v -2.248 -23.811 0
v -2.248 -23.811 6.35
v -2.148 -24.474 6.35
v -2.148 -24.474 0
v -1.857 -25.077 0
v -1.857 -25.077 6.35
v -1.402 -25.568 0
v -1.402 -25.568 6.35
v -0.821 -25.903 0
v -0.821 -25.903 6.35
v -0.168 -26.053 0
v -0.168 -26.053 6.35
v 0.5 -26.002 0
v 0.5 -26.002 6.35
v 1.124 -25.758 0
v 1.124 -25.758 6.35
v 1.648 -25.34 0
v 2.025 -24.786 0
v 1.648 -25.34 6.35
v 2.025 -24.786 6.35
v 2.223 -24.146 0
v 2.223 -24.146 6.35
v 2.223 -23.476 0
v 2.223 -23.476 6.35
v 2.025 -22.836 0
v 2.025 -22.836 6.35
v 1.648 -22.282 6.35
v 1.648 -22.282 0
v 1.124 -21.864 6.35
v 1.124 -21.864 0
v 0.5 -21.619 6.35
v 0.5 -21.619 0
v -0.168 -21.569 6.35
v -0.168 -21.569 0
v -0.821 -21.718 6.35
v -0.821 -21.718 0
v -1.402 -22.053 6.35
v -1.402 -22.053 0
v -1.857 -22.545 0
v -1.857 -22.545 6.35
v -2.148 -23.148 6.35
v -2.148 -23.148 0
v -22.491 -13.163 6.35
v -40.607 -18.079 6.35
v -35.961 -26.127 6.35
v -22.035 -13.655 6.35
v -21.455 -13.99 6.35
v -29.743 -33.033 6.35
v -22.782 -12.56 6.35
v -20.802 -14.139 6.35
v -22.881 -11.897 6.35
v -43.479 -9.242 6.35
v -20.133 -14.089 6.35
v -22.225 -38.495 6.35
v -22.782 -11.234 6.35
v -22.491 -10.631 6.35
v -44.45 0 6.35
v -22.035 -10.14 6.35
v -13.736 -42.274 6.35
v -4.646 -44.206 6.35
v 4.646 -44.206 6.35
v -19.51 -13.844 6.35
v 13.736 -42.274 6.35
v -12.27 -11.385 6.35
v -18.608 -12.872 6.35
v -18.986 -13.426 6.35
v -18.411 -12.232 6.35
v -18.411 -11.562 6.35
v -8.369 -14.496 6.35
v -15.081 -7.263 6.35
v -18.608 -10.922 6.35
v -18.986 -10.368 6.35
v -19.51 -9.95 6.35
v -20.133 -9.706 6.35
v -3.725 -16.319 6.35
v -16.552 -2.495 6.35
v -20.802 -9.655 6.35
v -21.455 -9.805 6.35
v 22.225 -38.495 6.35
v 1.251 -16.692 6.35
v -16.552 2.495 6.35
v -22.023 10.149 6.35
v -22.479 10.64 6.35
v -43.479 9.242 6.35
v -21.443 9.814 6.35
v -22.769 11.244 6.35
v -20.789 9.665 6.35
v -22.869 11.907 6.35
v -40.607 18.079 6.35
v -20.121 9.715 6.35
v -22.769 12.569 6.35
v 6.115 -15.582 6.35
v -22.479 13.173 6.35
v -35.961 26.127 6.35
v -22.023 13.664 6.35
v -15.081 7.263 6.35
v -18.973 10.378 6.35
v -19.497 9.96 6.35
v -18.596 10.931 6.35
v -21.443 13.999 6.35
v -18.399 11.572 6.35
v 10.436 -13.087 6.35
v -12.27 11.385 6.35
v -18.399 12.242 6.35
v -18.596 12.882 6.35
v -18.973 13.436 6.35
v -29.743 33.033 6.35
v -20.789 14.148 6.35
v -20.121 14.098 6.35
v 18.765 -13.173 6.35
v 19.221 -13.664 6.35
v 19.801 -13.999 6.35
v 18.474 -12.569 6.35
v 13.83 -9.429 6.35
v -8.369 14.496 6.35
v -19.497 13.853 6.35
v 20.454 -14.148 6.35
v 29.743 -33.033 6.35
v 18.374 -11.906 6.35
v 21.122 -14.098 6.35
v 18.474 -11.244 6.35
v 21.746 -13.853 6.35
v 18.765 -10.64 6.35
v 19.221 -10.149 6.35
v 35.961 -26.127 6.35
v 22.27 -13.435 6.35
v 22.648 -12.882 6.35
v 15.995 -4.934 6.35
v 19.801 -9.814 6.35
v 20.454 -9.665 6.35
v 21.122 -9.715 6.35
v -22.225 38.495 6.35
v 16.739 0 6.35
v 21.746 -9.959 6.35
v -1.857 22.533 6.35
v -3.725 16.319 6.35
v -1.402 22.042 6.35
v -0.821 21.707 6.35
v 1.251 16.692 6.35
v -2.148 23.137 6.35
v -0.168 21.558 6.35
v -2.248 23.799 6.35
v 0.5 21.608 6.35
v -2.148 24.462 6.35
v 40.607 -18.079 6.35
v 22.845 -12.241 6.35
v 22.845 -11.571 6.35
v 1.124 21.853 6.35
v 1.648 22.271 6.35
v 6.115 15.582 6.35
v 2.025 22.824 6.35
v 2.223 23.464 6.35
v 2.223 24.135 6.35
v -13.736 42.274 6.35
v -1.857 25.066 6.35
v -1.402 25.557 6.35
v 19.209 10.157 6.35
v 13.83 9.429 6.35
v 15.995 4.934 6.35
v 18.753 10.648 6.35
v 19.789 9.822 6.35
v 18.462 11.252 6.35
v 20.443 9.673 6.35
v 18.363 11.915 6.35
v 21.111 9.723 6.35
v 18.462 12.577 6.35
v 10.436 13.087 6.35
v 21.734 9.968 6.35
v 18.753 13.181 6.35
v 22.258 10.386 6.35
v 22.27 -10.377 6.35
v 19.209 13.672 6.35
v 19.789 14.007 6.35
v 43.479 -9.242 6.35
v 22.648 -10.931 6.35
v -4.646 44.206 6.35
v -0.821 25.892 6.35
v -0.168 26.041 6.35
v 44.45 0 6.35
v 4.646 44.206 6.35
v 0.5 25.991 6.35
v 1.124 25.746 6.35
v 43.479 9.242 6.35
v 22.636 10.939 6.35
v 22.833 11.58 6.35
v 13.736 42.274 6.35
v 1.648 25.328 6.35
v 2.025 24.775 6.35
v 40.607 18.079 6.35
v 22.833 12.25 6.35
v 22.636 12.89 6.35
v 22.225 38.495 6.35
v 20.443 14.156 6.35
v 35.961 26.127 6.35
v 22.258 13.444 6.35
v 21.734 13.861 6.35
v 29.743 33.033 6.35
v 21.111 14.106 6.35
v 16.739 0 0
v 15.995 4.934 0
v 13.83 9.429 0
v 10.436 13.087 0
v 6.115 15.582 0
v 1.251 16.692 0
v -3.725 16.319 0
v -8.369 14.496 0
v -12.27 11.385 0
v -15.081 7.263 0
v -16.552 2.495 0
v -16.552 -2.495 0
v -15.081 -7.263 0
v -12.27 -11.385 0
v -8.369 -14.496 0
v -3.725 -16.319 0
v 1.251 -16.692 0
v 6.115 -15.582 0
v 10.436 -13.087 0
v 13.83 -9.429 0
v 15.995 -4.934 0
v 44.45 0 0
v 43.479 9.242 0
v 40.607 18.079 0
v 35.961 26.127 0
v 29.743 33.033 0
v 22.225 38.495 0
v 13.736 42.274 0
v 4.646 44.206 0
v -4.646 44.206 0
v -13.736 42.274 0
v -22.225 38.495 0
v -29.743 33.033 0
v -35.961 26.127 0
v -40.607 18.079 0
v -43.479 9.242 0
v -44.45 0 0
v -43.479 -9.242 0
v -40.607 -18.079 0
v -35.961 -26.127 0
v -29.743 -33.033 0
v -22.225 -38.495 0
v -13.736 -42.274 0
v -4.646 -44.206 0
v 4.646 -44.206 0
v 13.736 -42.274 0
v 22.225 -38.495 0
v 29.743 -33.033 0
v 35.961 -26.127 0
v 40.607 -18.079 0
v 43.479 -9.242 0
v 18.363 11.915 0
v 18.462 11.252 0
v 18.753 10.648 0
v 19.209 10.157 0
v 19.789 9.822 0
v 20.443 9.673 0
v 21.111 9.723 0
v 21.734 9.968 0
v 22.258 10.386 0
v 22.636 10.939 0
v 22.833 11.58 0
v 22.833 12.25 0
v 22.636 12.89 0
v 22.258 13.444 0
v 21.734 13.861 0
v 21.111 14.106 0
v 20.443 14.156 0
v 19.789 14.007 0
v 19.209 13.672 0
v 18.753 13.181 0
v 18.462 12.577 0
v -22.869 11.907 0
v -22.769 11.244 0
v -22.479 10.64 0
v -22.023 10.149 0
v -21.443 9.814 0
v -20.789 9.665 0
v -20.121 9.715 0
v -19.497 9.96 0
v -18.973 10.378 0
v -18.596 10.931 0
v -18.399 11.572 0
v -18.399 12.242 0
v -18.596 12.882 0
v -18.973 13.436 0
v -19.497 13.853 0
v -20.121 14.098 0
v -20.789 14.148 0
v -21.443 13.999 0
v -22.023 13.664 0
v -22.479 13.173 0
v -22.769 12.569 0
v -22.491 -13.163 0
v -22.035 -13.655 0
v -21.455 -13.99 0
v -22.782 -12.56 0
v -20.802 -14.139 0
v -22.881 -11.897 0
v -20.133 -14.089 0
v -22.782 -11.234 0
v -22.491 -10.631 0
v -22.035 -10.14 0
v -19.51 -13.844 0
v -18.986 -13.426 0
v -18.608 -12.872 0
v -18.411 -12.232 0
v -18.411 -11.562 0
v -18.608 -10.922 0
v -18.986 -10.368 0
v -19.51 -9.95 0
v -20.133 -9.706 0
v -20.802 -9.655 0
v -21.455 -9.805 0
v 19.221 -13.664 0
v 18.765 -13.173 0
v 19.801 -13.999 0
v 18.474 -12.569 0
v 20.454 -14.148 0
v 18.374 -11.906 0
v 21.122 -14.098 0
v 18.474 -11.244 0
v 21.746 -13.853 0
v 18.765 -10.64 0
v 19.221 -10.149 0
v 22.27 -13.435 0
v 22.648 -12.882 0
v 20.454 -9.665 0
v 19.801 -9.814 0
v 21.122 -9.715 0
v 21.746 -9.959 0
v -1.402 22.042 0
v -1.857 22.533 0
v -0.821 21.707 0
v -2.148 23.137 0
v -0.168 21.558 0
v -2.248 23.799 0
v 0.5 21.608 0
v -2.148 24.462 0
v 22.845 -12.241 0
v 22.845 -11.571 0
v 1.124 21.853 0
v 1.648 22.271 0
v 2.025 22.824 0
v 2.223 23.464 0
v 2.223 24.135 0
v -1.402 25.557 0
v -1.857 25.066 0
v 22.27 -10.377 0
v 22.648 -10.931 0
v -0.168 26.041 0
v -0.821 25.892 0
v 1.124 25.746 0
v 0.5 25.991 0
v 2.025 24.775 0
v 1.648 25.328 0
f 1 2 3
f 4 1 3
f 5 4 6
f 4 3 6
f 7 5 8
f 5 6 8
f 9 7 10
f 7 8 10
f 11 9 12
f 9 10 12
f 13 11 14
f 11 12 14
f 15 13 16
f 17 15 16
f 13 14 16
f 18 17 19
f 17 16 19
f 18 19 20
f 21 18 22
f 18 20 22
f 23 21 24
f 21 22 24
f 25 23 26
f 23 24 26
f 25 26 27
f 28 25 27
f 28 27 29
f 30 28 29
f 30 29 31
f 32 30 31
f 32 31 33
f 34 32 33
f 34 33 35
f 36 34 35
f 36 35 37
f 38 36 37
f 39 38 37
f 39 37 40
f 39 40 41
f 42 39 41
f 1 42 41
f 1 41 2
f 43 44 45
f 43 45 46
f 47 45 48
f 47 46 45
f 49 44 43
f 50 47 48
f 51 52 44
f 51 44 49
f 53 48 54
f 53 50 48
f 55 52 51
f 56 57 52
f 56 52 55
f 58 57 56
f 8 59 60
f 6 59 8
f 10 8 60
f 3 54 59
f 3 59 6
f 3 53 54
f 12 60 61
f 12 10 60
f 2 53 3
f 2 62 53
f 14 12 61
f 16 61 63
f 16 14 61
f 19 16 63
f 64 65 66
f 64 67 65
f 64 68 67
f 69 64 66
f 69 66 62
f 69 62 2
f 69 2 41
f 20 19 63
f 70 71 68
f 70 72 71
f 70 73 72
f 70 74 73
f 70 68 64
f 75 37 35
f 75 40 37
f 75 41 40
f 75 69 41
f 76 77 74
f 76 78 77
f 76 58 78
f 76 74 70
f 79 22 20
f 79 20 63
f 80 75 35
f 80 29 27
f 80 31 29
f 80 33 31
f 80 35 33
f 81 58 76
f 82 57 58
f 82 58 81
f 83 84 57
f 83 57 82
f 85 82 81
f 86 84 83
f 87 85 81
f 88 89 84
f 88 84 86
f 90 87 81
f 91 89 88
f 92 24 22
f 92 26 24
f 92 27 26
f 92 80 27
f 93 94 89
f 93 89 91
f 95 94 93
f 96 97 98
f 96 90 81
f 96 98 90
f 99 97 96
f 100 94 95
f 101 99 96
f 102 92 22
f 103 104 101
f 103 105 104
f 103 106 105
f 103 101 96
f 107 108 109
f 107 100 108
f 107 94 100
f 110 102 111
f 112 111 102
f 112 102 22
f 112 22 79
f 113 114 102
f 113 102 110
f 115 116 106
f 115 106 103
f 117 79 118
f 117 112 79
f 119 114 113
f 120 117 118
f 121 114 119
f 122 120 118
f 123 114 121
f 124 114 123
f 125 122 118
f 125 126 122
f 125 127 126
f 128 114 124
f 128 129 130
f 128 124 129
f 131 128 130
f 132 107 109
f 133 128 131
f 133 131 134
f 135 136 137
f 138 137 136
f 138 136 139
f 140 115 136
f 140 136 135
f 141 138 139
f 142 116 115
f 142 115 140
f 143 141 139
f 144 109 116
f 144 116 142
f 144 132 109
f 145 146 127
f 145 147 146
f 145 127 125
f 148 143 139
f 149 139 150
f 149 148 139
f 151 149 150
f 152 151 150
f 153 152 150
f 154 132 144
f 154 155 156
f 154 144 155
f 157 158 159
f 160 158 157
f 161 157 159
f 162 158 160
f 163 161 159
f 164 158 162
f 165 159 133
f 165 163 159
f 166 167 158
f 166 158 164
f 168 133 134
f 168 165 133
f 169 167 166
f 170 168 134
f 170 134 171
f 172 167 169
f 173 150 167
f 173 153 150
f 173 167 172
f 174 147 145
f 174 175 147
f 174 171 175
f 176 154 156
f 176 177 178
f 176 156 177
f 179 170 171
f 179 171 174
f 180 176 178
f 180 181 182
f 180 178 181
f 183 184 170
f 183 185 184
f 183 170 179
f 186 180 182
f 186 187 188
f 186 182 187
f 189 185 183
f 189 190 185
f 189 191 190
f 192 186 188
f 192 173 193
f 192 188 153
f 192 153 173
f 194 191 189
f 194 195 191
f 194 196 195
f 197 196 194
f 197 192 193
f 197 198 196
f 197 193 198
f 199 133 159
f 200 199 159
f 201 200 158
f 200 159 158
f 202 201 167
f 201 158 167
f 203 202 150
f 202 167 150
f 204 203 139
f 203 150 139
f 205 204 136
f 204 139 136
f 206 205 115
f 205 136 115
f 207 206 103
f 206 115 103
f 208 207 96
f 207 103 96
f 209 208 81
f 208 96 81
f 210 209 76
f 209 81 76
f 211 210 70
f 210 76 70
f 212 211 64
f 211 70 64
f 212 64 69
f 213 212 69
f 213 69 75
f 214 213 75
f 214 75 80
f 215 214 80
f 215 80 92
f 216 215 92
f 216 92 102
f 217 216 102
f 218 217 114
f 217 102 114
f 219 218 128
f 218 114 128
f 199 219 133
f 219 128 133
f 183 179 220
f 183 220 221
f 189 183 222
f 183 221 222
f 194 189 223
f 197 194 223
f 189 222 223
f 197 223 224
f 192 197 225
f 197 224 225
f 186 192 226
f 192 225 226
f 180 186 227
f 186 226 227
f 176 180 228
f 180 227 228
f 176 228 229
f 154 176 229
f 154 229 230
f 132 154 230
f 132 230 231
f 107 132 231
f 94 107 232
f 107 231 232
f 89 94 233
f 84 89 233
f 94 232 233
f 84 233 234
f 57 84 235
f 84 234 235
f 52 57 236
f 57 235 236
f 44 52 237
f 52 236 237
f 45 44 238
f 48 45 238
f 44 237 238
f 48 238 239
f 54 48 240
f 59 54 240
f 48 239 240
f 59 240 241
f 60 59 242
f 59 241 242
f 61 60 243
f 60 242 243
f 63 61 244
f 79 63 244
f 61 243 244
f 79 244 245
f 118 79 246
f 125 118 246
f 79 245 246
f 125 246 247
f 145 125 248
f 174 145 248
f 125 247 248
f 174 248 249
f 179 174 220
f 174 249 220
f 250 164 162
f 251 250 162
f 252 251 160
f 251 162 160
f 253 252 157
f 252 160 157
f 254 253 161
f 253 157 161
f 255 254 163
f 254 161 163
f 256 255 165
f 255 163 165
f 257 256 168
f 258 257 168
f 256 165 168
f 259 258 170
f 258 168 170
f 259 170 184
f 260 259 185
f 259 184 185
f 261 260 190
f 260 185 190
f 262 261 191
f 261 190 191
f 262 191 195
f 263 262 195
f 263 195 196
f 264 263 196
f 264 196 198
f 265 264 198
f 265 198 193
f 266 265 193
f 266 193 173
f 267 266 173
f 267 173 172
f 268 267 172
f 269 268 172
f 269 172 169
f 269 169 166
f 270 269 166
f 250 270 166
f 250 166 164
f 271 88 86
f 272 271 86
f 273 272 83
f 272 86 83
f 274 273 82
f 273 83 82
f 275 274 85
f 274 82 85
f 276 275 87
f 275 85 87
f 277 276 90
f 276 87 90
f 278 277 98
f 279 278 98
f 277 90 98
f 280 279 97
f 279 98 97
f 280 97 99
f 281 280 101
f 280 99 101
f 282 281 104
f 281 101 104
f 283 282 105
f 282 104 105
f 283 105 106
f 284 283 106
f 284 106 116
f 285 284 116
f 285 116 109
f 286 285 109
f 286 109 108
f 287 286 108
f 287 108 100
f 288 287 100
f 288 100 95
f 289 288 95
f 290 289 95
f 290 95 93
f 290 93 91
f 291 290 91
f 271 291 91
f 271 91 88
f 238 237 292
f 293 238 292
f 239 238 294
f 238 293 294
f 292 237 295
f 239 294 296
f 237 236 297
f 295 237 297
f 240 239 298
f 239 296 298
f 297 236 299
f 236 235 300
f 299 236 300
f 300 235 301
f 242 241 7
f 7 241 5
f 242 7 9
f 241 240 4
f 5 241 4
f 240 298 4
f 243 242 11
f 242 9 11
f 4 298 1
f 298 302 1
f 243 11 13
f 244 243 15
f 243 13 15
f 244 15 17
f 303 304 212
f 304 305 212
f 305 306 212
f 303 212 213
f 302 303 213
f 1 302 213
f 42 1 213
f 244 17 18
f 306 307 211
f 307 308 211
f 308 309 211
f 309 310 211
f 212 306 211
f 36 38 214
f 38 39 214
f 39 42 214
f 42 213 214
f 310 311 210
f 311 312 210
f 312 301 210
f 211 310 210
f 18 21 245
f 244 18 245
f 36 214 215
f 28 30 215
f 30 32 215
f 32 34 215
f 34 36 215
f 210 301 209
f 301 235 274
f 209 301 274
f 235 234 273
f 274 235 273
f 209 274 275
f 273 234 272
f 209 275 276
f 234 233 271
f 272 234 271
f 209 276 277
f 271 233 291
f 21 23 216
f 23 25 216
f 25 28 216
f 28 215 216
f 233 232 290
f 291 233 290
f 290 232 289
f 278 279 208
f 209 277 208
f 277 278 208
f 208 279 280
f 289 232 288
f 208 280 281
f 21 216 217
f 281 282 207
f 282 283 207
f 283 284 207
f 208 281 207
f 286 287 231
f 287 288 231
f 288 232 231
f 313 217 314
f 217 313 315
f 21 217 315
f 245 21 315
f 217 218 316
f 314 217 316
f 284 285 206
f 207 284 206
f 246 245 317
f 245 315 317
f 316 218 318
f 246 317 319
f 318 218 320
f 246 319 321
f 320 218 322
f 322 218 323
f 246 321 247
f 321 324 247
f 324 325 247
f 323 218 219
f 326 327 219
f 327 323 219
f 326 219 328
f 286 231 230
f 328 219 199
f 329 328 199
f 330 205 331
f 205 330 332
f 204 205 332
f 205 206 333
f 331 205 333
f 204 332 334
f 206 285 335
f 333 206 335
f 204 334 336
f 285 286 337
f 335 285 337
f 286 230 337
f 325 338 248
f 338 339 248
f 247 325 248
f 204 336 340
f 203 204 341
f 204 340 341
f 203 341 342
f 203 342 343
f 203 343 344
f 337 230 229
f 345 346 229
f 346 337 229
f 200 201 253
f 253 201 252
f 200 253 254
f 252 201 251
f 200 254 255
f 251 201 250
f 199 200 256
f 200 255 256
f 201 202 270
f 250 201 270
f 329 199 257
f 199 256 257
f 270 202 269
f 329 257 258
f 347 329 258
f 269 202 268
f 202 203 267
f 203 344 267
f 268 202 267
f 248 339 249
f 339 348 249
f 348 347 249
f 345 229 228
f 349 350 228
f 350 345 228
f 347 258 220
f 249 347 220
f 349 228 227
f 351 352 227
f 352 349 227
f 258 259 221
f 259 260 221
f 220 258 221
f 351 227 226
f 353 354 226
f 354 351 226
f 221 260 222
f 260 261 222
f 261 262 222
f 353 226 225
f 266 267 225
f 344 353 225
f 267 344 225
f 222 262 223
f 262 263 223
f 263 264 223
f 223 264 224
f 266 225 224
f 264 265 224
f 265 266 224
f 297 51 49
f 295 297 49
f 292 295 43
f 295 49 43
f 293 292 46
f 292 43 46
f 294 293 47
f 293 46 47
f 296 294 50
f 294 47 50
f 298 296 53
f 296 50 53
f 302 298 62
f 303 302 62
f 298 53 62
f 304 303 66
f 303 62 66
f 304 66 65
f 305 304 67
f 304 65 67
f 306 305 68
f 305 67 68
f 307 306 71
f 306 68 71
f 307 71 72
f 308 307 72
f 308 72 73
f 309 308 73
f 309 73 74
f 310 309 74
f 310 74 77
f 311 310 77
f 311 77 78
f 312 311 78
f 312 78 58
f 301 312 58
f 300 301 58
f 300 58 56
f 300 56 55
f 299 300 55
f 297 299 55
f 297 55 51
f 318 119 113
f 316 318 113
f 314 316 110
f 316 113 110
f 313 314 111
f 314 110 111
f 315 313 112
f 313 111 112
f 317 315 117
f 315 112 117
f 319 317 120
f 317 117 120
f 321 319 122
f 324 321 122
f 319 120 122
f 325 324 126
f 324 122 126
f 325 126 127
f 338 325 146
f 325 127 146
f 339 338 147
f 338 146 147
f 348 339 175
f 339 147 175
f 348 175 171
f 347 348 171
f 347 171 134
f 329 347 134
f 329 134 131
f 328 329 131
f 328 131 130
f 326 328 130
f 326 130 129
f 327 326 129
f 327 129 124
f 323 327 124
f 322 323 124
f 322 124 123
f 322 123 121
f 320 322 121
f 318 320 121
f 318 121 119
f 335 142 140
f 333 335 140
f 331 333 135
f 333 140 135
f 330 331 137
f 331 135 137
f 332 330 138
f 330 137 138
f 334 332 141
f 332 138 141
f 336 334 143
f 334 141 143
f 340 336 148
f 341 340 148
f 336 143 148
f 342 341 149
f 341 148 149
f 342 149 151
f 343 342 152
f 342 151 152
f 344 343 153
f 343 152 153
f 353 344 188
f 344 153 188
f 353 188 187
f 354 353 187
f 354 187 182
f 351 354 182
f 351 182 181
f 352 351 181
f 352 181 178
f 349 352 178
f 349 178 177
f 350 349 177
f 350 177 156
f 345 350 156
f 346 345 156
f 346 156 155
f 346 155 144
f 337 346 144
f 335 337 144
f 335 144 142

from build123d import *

# Parameters (mm, degrees)
F0_R     = 44.45
F1_DEPTH = 6.35
F2_R     = 16.7386
F3_DEPTH = 6.35
F10_D    = 4.4958
F11_D    = 4.4958
F12_D    = 4.4958
F13_D    = 4.4958
F14_D    = 4.4958
F15_D    = 4.4958


with BuildPart() as f1:
    # F0 (on Top) → F1 (new body)
    with BuildSketch(Plane.XY):
        Circle(F0_R)
    extrude(amount=F1_DEPTH)

    # F2 (on face) → F3 (cut)
    with BuildSketch(Plane.XY.offset(6.35)):
        Circle(F2_R)
    extrude(amount=-F3_DEPTH, mode=Mode.SUBTRACT)

    # F10 (through all)
    with Locations(Plane(origin=(0, 0, 0), x_dir=(1, 0, 0), z_dir=(0, 0, -1))):
        with Locations((0, -23.7994737715)):
            Hole(F10_D / 2)

    # F11 (through all)
    with Locations(Plane(origin=(0, 0, 0), x_dir=(1, 0, 0), z_dir=(0, 0, -1))):
        with Locations((-20.6213220954, -11.9066275656)):
            Hole(F11_D / 2)

    # F12 (through all)
    with Locations(Plane(origin=(0, 0, 0), x_dir=(1, 0, 0), z_dir=(0, 0, -1))):
        with Locations((20.6105131656, -11.9145931676)):
            Hole(F12_D / 2)

    # F13 (through all)
    with Locations(Plane(origin=(0, 0, 0), x_dir=(1, 0, 0), z_dir=(0, 0, -1))):
        with Locations((-20.6335756557, 11.8970761348)):
            Hole(F13_D / 2)

    # F14 (through all)
    with Locations(Plane(origin=(0, 0, 0), x_dir=(1, 0, 0), z_dir=(0, 0, -1))):
        with Locations((20.6222459674, 11.9062252343)):
            Hole(F14_D / 2)

    # F15 (through all)
    with Locations(Plane(origin=(0, 0, 0), x_dir=(1, 0, 0), z_dir=(0, 0, -1))):
        with Locations((0, 23.8109349498)):
            Hole(F15_D / 2)


solid = f1.part
